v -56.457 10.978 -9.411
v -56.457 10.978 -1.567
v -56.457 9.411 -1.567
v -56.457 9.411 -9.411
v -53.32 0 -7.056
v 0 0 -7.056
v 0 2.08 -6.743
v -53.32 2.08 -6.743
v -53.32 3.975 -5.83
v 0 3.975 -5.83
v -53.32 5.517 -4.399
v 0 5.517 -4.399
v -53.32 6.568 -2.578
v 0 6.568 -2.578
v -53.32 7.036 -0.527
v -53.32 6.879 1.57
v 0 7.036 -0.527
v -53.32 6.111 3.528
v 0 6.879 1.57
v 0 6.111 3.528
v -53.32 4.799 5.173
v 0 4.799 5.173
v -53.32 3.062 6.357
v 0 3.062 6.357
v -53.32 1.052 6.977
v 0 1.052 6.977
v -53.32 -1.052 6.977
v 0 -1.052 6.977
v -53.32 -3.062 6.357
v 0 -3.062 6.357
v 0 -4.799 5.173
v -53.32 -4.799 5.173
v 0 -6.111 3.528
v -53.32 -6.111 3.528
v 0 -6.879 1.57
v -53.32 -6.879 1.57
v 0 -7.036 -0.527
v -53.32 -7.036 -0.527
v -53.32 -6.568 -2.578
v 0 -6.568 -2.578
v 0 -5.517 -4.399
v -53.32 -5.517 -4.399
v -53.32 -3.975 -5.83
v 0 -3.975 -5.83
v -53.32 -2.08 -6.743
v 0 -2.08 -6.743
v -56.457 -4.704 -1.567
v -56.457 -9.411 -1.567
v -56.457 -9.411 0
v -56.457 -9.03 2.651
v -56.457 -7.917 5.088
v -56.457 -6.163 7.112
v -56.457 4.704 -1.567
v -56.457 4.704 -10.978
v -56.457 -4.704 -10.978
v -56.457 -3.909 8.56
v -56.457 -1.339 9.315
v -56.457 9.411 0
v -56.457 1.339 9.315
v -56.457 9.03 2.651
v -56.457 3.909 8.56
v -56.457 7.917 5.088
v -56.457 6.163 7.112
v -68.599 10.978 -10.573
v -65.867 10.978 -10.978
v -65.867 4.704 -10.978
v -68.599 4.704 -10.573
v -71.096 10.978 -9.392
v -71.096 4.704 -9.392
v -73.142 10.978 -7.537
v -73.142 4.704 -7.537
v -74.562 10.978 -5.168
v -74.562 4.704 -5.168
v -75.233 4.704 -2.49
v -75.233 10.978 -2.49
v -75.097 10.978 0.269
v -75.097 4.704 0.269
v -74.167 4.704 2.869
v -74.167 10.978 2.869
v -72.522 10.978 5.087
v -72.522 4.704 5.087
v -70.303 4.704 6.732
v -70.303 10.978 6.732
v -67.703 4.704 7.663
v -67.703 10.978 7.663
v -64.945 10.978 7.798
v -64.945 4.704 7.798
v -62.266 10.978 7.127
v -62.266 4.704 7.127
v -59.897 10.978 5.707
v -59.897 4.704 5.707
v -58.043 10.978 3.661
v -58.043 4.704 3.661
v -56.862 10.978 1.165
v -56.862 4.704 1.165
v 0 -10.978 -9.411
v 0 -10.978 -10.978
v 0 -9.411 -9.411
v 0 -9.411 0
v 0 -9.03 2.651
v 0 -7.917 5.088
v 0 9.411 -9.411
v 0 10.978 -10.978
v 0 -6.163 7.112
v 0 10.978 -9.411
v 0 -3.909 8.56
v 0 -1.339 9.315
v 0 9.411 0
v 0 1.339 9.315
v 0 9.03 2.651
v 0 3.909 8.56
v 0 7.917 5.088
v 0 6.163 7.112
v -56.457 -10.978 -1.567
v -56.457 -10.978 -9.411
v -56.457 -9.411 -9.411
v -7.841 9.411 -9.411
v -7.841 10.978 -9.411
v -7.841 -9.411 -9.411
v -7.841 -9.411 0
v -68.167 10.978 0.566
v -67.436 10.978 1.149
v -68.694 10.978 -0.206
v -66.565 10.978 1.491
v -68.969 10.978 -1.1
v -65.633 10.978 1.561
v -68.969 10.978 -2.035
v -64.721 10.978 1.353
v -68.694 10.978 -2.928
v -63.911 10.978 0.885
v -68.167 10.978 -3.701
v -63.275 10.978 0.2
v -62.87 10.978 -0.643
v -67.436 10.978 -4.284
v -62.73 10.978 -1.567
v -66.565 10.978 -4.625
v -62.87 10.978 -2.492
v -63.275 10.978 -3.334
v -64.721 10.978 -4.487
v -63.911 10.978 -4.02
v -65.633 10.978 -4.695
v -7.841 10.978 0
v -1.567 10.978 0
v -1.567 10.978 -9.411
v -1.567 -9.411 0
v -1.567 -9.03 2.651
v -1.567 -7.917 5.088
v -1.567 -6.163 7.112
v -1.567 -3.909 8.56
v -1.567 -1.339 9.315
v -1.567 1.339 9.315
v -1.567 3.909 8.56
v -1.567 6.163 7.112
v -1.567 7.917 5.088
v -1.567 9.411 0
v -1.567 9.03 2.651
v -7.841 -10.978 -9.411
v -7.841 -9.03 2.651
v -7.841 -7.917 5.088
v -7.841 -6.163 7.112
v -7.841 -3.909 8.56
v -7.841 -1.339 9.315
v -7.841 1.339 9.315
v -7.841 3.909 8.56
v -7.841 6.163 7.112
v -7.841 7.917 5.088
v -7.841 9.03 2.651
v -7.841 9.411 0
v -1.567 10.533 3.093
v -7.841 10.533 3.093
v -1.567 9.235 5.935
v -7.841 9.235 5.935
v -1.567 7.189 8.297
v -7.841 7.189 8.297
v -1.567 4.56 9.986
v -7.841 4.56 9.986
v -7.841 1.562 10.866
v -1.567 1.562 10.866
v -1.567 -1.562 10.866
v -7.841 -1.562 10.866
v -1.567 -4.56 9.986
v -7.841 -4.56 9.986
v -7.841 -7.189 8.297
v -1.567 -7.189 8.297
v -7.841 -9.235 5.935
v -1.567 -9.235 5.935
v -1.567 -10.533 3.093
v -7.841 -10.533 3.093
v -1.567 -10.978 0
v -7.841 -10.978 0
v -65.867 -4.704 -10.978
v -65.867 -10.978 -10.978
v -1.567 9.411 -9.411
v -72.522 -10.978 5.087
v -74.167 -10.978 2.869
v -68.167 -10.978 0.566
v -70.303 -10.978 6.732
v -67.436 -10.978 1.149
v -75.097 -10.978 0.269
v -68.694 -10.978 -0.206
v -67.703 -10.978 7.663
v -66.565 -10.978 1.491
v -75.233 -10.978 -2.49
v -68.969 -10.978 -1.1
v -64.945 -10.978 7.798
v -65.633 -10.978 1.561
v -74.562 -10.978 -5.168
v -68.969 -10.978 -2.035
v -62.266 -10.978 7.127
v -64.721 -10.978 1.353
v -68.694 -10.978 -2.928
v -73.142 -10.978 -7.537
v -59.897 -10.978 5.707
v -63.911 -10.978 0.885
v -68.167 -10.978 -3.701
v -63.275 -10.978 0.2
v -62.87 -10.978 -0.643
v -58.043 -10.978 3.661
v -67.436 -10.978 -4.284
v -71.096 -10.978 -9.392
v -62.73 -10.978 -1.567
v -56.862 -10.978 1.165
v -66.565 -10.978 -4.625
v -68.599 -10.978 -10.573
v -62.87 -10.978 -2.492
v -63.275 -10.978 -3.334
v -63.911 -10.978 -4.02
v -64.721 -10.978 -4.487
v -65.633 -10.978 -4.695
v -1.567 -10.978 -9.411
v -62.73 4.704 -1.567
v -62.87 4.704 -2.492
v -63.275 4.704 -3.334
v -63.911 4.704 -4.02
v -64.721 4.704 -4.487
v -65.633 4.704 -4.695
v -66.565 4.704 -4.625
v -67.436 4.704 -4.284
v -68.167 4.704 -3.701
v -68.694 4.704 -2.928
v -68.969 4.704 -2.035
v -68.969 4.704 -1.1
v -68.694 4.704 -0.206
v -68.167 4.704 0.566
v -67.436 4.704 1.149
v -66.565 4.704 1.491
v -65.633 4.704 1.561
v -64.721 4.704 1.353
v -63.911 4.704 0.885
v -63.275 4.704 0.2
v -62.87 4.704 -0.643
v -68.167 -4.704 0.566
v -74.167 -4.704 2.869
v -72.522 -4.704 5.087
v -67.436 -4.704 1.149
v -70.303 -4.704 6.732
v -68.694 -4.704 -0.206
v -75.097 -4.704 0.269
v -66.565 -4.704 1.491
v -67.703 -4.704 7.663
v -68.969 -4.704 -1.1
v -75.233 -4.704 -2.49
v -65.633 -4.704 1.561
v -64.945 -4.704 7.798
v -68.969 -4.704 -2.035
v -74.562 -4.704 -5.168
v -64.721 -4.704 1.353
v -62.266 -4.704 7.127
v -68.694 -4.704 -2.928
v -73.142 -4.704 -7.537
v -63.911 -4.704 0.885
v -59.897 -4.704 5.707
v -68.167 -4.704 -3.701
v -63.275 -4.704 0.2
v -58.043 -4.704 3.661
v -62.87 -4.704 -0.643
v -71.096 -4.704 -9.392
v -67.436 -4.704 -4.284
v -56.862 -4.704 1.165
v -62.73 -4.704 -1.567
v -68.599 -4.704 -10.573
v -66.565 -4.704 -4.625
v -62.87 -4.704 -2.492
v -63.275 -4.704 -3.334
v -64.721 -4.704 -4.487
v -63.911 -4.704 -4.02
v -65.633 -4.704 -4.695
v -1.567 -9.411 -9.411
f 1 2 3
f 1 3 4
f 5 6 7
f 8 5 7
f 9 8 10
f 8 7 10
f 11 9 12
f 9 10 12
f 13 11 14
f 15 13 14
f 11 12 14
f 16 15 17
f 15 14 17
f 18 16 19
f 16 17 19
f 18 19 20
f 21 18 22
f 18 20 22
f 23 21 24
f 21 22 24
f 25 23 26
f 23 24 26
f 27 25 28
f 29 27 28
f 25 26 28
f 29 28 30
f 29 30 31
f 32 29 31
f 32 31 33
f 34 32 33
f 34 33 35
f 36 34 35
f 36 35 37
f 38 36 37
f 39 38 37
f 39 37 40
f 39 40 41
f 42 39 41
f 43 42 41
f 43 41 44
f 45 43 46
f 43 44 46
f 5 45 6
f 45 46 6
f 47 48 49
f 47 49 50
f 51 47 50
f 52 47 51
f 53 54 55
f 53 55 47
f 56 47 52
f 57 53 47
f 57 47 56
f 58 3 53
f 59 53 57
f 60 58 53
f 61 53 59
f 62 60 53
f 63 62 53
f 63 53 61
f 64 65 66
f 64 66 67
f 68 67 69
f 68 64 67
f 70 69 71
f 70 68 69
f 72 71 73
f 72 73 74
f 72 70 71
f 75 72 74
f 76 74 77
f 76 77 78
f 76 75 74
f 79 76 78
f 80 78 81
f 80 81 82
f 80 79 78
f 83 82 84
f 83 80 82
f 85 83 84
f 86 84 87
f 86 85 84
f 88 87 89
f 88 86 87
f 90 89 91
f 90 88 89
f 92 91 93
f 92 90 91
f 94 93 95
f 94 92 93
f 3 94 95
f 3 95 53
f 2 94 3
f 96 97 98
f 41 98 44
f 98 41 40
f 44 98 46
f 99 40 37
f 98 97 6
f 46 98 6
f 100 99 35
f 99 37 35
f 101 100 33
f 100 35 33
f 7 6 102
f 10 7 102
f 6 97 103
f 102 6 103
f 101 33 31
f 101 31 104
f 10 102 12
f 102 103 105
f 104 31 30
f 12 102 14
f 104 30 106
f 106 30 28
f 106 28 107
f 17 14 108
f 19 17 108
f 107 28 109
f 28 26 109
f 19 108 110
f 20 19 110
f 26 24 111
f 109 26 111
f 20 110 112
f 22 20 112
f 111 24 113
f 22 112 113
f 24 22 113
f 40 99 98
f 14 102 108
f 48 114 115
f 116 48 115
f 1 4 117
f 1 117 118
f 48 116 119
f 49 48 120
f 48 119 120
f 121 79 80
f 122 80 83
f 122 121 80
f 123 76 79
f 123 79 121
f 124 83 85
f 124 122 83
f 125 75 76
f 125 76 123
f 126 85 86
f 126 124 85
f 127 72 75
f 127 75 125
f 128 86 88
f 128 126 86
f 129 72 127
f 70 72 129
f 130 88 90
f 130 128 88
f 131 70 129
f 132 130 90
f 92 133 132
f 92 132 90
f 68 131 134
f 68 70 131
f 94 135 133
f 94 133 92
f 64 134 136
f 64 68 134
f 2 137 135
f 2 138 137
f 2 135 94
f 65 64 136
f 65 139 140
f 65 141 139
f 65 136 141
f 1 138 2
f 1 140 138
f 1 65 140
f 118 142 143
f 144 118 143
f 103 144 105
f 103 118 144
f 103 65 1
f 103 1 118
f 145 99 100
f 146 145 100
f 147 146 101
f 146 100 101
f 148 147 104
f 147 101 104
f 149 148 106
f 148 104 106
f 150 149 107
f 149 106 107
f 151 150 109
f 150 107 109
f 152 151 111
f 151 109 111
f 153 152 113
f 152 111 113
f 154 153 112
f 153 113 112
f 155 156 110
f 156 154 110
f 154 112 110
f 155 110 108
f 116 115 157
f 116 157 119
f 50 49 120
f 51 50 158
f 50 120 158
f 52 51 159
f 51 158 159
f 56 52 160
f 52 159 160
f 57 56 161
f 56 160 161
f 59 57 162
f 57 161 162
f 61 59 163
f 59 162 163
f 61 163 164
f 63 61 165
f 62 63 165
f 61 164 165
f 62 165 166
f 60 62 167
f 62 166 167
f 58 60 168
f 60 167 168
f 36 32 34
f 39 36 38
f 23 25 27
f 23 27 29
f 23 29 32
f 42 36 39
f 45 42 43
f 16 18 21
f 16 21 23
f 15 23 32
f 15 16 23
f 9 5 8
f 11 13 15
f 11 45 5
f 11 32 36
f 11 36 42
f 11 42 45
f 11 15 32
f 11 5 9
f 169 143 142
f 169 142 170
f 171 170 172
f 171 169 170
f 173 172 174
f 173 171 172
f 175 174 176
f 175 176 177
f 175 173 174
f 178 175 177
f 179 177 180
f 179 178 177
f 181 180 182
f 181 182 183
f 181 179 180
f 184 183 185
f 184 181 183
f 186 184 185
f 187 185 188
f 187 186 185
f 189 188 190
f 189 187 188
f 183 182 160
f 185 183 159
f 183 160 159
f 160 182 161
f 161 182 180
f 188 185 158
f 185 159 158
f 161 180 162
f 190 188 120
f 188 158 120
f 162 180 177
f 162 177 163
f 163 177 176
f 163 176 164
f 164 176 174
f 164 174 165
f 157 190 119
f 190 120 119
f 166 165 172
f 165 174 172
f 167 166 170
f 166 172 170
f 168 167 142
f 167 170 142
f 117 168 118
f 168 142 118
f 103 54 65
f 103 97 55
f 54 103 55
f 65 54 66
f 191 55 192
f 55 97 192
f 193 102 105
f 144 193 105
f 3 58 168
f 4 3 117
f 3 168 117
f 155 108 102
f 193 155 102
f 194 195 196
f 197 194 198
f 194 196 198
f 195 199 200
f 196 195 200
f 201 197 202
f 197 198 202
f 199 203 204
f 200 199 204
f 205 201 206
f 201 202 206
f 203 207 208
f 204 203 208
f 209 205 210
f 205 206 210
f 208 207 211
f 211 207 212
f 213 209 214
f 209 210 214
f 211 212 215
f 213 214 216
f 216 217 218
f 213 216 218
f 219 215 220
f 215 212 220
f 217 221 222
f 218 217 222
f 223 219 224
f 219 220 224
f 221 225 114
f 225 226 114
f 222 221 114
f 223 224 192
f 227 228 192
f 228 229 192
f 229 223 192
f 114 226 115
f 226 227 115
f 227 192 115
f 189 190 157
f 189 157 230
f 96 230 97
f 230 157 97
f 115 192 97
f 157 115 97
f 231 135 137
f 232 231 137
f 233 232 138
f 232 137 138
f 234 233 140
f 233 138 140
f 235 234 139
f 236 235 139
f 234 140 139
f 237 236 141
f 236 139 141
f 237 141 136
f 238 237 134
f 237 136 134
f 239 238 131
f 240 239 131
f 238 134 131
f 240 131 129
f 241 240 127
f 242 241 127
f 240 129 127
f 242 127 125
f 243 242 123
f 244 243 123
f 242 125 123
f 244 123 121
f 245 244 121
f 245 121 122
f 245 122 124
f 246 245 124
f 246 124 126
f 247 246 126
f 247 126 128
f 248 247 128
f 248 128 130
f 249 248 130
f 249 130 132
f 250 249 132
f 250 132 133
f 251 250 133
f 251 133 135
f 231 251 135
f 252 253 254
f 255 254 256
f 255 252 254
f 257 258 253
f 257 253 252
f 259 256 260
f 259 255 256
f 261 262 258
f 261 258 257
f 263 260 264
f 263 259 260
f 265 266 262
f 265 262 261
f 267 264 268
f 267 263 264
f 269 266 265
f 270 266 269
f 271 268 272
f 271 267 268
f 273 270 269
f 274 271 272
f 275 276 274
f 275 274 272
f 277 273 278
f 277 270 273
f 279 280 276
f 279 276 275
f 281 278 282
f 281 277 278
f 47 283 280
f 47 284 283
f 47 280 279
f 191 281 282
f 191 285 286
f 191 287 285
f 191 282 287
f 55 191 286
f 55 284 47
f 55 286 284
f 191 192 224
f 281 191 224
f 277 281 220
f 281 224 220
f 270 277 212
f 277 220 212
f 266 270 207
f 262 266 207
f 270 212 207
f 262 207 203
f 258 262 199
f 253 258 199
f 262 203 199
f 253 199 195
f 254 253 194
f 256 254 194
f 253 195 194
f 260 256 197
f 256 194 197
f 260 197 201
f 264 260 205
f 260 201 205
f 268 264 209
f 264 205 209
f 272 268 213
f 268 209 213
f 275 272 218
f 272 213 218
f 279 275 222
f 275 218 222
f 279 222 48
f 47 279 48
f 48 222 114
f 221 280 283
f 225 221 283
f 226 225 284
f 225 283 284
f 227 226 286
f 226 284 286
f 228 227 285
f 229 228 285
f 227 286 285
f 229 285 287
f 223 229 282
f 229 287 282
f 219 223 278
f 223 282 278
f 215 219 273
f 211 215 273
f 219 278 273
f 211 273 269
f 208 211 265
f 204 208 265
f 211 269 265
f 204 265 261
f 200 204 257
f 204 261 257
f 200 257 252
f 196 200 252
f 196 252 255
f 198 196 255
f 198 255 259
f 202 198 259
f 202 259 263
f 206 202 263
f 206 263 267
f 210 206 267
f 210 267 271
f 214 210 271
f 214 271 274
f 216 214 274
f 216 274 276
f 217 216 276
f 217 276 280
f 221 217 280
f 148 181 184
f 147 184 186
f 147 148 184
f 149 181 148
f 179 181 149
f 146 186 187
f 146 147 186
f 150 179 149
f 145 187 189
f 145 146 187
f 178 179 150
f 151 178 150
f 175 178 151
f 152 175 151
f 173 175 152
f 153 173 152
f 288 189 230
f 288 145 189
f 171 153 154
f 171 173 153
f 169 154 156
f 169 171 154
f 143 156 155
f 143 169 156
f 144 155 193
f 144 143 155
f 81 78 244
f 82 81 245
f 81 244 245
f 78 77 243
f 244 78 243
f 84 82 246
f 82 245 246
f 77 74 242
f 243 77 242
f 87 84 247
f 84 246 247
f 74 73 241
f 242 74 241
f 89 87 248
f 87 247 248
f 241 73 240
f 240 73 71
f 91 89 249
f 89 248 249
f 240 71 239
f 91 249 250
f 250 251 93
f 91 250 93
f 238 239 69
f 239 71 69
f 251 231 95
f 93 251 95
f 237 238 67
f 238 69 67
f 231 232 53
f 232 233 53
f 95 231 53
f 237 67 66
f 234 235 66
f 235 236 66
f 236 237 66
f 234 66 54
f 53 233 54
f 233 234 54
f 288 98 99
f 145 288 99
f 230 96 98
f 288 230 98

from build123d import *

# Parameters (mm, degrees)
BOSS_EXTRUDE1_DEPTH = 56.45658
BOSS_EXTRUDE2_DEPTH = 6.2738
BOSS_EXTRUDE3_DEPTH = 6.2738
SKETCH5_R           = 3.1369
CUT_EXTRUDE1_DEPTH  = 22.95576
SKETCH6_R           = 7.05612
CUT_EXTRUDE2_DEPTH  = 53.31968


with BuildPart() as part:
    # Sketch1 → Boss-Extrude1 (new body)
    with BuildSketch(Plane(origin=(0, 0, 0), x_dir=(0, 0, -1), z_dir=(1, 0, 0))):
        with BuildLine():
            Line((10.97788, 10.97788), (10.97788, -10.97788))
            Line((10.97788, -10.97788), (9.4107, -10.97788))
            Line((9.4107, -10.97788), (9.4107, -9.4107))
            Line((9.4107, -9.4107), (0, -9.4107))
            ThreePointArc((0, -9.4107), (-9.4107, 0), (0, 9.4107))
            Line((0, 9.4107), (9.4107, 9.4107))
            Line((9.4107, 9.4107), (9.4107, 10.97788))
            Line((9.4107, 10.97788), (10.97788, 10.97788))
        make_face()
    extrude(amount=-BOSS_EXTRUDE1_DEPTH)

    # Sketch3 → Boss-Extrude2 (add)
    with BuildSketch(Plane(origin=(-1.56718, 0, 0), x_dir=(0, 0, -1), z_dir=(1, 0, 0))):
        with BuildLine():
            Line((9.4107, 10.97788), (0, 10.97788))
            ThreePointArc((0, 10.97788), (-10.97788, 0), (0, -10.97788))
            Line((0, -10.97788), (9.4107, -10.97788))
            Line((9.4107, -10.97788), (9.4107, 10.97788))
        make_face()
    extrude(amount=-BOSS_EXTRUDE2_DEPTH)

    # Sketch4 → Boss-Extrude3 (add)
    with BuildSketch(Plane(origin=(0, 10.97788, 0), x_dir=(1, 0, 0), z_dir=(0, 1, 0))):
        with BuildLine():
            Line((-56.45658, 10.97788), (-65.86728, 10.97788))
            ThreePointArc((-65.86728, 10.97788), (-72.521649786, -5.087189786), (-56.45658, 1.56718))
            Line((-56.45658, 1.56718), (-56.45658, 10.97788))
        make_face()
    boss_extrude3 = extrude(amount=-BOSS_EXTRUDE3_DEPTH)

    # Mirror1: Boss-Extrude3 across plane
    add(boss_extrude3.mirror(Plane.ZX))

    # Sketch5 → Cut-Extrude1 (cut, through all)
    with BuildSketch(Plane(origin=(0, 10.97788, 0), x_dir=(1, 0, 0), z_dir=(0, 1, 0))):
        with Locations((-65.86728, 1.56718)):
            Circle(SKETCH5_R)
    extrude(amount=-CUT_EXTRUDE1_DEPTH, mode=Mode.SUBTRACT)

    # Sketch6 → Cut-Extrude2 (cut)
    with BuildSketch(Plane(origin=(0, 0, 0), x_dir=(0, 0, -1), z_dir=(1, 0, 0))):
        Circle(SKETCH6_R)
    extrude(amount=-CUT_EXTRUDE2_DEPTH, mode=Mode.SUBTRACT)


solid = part.part
